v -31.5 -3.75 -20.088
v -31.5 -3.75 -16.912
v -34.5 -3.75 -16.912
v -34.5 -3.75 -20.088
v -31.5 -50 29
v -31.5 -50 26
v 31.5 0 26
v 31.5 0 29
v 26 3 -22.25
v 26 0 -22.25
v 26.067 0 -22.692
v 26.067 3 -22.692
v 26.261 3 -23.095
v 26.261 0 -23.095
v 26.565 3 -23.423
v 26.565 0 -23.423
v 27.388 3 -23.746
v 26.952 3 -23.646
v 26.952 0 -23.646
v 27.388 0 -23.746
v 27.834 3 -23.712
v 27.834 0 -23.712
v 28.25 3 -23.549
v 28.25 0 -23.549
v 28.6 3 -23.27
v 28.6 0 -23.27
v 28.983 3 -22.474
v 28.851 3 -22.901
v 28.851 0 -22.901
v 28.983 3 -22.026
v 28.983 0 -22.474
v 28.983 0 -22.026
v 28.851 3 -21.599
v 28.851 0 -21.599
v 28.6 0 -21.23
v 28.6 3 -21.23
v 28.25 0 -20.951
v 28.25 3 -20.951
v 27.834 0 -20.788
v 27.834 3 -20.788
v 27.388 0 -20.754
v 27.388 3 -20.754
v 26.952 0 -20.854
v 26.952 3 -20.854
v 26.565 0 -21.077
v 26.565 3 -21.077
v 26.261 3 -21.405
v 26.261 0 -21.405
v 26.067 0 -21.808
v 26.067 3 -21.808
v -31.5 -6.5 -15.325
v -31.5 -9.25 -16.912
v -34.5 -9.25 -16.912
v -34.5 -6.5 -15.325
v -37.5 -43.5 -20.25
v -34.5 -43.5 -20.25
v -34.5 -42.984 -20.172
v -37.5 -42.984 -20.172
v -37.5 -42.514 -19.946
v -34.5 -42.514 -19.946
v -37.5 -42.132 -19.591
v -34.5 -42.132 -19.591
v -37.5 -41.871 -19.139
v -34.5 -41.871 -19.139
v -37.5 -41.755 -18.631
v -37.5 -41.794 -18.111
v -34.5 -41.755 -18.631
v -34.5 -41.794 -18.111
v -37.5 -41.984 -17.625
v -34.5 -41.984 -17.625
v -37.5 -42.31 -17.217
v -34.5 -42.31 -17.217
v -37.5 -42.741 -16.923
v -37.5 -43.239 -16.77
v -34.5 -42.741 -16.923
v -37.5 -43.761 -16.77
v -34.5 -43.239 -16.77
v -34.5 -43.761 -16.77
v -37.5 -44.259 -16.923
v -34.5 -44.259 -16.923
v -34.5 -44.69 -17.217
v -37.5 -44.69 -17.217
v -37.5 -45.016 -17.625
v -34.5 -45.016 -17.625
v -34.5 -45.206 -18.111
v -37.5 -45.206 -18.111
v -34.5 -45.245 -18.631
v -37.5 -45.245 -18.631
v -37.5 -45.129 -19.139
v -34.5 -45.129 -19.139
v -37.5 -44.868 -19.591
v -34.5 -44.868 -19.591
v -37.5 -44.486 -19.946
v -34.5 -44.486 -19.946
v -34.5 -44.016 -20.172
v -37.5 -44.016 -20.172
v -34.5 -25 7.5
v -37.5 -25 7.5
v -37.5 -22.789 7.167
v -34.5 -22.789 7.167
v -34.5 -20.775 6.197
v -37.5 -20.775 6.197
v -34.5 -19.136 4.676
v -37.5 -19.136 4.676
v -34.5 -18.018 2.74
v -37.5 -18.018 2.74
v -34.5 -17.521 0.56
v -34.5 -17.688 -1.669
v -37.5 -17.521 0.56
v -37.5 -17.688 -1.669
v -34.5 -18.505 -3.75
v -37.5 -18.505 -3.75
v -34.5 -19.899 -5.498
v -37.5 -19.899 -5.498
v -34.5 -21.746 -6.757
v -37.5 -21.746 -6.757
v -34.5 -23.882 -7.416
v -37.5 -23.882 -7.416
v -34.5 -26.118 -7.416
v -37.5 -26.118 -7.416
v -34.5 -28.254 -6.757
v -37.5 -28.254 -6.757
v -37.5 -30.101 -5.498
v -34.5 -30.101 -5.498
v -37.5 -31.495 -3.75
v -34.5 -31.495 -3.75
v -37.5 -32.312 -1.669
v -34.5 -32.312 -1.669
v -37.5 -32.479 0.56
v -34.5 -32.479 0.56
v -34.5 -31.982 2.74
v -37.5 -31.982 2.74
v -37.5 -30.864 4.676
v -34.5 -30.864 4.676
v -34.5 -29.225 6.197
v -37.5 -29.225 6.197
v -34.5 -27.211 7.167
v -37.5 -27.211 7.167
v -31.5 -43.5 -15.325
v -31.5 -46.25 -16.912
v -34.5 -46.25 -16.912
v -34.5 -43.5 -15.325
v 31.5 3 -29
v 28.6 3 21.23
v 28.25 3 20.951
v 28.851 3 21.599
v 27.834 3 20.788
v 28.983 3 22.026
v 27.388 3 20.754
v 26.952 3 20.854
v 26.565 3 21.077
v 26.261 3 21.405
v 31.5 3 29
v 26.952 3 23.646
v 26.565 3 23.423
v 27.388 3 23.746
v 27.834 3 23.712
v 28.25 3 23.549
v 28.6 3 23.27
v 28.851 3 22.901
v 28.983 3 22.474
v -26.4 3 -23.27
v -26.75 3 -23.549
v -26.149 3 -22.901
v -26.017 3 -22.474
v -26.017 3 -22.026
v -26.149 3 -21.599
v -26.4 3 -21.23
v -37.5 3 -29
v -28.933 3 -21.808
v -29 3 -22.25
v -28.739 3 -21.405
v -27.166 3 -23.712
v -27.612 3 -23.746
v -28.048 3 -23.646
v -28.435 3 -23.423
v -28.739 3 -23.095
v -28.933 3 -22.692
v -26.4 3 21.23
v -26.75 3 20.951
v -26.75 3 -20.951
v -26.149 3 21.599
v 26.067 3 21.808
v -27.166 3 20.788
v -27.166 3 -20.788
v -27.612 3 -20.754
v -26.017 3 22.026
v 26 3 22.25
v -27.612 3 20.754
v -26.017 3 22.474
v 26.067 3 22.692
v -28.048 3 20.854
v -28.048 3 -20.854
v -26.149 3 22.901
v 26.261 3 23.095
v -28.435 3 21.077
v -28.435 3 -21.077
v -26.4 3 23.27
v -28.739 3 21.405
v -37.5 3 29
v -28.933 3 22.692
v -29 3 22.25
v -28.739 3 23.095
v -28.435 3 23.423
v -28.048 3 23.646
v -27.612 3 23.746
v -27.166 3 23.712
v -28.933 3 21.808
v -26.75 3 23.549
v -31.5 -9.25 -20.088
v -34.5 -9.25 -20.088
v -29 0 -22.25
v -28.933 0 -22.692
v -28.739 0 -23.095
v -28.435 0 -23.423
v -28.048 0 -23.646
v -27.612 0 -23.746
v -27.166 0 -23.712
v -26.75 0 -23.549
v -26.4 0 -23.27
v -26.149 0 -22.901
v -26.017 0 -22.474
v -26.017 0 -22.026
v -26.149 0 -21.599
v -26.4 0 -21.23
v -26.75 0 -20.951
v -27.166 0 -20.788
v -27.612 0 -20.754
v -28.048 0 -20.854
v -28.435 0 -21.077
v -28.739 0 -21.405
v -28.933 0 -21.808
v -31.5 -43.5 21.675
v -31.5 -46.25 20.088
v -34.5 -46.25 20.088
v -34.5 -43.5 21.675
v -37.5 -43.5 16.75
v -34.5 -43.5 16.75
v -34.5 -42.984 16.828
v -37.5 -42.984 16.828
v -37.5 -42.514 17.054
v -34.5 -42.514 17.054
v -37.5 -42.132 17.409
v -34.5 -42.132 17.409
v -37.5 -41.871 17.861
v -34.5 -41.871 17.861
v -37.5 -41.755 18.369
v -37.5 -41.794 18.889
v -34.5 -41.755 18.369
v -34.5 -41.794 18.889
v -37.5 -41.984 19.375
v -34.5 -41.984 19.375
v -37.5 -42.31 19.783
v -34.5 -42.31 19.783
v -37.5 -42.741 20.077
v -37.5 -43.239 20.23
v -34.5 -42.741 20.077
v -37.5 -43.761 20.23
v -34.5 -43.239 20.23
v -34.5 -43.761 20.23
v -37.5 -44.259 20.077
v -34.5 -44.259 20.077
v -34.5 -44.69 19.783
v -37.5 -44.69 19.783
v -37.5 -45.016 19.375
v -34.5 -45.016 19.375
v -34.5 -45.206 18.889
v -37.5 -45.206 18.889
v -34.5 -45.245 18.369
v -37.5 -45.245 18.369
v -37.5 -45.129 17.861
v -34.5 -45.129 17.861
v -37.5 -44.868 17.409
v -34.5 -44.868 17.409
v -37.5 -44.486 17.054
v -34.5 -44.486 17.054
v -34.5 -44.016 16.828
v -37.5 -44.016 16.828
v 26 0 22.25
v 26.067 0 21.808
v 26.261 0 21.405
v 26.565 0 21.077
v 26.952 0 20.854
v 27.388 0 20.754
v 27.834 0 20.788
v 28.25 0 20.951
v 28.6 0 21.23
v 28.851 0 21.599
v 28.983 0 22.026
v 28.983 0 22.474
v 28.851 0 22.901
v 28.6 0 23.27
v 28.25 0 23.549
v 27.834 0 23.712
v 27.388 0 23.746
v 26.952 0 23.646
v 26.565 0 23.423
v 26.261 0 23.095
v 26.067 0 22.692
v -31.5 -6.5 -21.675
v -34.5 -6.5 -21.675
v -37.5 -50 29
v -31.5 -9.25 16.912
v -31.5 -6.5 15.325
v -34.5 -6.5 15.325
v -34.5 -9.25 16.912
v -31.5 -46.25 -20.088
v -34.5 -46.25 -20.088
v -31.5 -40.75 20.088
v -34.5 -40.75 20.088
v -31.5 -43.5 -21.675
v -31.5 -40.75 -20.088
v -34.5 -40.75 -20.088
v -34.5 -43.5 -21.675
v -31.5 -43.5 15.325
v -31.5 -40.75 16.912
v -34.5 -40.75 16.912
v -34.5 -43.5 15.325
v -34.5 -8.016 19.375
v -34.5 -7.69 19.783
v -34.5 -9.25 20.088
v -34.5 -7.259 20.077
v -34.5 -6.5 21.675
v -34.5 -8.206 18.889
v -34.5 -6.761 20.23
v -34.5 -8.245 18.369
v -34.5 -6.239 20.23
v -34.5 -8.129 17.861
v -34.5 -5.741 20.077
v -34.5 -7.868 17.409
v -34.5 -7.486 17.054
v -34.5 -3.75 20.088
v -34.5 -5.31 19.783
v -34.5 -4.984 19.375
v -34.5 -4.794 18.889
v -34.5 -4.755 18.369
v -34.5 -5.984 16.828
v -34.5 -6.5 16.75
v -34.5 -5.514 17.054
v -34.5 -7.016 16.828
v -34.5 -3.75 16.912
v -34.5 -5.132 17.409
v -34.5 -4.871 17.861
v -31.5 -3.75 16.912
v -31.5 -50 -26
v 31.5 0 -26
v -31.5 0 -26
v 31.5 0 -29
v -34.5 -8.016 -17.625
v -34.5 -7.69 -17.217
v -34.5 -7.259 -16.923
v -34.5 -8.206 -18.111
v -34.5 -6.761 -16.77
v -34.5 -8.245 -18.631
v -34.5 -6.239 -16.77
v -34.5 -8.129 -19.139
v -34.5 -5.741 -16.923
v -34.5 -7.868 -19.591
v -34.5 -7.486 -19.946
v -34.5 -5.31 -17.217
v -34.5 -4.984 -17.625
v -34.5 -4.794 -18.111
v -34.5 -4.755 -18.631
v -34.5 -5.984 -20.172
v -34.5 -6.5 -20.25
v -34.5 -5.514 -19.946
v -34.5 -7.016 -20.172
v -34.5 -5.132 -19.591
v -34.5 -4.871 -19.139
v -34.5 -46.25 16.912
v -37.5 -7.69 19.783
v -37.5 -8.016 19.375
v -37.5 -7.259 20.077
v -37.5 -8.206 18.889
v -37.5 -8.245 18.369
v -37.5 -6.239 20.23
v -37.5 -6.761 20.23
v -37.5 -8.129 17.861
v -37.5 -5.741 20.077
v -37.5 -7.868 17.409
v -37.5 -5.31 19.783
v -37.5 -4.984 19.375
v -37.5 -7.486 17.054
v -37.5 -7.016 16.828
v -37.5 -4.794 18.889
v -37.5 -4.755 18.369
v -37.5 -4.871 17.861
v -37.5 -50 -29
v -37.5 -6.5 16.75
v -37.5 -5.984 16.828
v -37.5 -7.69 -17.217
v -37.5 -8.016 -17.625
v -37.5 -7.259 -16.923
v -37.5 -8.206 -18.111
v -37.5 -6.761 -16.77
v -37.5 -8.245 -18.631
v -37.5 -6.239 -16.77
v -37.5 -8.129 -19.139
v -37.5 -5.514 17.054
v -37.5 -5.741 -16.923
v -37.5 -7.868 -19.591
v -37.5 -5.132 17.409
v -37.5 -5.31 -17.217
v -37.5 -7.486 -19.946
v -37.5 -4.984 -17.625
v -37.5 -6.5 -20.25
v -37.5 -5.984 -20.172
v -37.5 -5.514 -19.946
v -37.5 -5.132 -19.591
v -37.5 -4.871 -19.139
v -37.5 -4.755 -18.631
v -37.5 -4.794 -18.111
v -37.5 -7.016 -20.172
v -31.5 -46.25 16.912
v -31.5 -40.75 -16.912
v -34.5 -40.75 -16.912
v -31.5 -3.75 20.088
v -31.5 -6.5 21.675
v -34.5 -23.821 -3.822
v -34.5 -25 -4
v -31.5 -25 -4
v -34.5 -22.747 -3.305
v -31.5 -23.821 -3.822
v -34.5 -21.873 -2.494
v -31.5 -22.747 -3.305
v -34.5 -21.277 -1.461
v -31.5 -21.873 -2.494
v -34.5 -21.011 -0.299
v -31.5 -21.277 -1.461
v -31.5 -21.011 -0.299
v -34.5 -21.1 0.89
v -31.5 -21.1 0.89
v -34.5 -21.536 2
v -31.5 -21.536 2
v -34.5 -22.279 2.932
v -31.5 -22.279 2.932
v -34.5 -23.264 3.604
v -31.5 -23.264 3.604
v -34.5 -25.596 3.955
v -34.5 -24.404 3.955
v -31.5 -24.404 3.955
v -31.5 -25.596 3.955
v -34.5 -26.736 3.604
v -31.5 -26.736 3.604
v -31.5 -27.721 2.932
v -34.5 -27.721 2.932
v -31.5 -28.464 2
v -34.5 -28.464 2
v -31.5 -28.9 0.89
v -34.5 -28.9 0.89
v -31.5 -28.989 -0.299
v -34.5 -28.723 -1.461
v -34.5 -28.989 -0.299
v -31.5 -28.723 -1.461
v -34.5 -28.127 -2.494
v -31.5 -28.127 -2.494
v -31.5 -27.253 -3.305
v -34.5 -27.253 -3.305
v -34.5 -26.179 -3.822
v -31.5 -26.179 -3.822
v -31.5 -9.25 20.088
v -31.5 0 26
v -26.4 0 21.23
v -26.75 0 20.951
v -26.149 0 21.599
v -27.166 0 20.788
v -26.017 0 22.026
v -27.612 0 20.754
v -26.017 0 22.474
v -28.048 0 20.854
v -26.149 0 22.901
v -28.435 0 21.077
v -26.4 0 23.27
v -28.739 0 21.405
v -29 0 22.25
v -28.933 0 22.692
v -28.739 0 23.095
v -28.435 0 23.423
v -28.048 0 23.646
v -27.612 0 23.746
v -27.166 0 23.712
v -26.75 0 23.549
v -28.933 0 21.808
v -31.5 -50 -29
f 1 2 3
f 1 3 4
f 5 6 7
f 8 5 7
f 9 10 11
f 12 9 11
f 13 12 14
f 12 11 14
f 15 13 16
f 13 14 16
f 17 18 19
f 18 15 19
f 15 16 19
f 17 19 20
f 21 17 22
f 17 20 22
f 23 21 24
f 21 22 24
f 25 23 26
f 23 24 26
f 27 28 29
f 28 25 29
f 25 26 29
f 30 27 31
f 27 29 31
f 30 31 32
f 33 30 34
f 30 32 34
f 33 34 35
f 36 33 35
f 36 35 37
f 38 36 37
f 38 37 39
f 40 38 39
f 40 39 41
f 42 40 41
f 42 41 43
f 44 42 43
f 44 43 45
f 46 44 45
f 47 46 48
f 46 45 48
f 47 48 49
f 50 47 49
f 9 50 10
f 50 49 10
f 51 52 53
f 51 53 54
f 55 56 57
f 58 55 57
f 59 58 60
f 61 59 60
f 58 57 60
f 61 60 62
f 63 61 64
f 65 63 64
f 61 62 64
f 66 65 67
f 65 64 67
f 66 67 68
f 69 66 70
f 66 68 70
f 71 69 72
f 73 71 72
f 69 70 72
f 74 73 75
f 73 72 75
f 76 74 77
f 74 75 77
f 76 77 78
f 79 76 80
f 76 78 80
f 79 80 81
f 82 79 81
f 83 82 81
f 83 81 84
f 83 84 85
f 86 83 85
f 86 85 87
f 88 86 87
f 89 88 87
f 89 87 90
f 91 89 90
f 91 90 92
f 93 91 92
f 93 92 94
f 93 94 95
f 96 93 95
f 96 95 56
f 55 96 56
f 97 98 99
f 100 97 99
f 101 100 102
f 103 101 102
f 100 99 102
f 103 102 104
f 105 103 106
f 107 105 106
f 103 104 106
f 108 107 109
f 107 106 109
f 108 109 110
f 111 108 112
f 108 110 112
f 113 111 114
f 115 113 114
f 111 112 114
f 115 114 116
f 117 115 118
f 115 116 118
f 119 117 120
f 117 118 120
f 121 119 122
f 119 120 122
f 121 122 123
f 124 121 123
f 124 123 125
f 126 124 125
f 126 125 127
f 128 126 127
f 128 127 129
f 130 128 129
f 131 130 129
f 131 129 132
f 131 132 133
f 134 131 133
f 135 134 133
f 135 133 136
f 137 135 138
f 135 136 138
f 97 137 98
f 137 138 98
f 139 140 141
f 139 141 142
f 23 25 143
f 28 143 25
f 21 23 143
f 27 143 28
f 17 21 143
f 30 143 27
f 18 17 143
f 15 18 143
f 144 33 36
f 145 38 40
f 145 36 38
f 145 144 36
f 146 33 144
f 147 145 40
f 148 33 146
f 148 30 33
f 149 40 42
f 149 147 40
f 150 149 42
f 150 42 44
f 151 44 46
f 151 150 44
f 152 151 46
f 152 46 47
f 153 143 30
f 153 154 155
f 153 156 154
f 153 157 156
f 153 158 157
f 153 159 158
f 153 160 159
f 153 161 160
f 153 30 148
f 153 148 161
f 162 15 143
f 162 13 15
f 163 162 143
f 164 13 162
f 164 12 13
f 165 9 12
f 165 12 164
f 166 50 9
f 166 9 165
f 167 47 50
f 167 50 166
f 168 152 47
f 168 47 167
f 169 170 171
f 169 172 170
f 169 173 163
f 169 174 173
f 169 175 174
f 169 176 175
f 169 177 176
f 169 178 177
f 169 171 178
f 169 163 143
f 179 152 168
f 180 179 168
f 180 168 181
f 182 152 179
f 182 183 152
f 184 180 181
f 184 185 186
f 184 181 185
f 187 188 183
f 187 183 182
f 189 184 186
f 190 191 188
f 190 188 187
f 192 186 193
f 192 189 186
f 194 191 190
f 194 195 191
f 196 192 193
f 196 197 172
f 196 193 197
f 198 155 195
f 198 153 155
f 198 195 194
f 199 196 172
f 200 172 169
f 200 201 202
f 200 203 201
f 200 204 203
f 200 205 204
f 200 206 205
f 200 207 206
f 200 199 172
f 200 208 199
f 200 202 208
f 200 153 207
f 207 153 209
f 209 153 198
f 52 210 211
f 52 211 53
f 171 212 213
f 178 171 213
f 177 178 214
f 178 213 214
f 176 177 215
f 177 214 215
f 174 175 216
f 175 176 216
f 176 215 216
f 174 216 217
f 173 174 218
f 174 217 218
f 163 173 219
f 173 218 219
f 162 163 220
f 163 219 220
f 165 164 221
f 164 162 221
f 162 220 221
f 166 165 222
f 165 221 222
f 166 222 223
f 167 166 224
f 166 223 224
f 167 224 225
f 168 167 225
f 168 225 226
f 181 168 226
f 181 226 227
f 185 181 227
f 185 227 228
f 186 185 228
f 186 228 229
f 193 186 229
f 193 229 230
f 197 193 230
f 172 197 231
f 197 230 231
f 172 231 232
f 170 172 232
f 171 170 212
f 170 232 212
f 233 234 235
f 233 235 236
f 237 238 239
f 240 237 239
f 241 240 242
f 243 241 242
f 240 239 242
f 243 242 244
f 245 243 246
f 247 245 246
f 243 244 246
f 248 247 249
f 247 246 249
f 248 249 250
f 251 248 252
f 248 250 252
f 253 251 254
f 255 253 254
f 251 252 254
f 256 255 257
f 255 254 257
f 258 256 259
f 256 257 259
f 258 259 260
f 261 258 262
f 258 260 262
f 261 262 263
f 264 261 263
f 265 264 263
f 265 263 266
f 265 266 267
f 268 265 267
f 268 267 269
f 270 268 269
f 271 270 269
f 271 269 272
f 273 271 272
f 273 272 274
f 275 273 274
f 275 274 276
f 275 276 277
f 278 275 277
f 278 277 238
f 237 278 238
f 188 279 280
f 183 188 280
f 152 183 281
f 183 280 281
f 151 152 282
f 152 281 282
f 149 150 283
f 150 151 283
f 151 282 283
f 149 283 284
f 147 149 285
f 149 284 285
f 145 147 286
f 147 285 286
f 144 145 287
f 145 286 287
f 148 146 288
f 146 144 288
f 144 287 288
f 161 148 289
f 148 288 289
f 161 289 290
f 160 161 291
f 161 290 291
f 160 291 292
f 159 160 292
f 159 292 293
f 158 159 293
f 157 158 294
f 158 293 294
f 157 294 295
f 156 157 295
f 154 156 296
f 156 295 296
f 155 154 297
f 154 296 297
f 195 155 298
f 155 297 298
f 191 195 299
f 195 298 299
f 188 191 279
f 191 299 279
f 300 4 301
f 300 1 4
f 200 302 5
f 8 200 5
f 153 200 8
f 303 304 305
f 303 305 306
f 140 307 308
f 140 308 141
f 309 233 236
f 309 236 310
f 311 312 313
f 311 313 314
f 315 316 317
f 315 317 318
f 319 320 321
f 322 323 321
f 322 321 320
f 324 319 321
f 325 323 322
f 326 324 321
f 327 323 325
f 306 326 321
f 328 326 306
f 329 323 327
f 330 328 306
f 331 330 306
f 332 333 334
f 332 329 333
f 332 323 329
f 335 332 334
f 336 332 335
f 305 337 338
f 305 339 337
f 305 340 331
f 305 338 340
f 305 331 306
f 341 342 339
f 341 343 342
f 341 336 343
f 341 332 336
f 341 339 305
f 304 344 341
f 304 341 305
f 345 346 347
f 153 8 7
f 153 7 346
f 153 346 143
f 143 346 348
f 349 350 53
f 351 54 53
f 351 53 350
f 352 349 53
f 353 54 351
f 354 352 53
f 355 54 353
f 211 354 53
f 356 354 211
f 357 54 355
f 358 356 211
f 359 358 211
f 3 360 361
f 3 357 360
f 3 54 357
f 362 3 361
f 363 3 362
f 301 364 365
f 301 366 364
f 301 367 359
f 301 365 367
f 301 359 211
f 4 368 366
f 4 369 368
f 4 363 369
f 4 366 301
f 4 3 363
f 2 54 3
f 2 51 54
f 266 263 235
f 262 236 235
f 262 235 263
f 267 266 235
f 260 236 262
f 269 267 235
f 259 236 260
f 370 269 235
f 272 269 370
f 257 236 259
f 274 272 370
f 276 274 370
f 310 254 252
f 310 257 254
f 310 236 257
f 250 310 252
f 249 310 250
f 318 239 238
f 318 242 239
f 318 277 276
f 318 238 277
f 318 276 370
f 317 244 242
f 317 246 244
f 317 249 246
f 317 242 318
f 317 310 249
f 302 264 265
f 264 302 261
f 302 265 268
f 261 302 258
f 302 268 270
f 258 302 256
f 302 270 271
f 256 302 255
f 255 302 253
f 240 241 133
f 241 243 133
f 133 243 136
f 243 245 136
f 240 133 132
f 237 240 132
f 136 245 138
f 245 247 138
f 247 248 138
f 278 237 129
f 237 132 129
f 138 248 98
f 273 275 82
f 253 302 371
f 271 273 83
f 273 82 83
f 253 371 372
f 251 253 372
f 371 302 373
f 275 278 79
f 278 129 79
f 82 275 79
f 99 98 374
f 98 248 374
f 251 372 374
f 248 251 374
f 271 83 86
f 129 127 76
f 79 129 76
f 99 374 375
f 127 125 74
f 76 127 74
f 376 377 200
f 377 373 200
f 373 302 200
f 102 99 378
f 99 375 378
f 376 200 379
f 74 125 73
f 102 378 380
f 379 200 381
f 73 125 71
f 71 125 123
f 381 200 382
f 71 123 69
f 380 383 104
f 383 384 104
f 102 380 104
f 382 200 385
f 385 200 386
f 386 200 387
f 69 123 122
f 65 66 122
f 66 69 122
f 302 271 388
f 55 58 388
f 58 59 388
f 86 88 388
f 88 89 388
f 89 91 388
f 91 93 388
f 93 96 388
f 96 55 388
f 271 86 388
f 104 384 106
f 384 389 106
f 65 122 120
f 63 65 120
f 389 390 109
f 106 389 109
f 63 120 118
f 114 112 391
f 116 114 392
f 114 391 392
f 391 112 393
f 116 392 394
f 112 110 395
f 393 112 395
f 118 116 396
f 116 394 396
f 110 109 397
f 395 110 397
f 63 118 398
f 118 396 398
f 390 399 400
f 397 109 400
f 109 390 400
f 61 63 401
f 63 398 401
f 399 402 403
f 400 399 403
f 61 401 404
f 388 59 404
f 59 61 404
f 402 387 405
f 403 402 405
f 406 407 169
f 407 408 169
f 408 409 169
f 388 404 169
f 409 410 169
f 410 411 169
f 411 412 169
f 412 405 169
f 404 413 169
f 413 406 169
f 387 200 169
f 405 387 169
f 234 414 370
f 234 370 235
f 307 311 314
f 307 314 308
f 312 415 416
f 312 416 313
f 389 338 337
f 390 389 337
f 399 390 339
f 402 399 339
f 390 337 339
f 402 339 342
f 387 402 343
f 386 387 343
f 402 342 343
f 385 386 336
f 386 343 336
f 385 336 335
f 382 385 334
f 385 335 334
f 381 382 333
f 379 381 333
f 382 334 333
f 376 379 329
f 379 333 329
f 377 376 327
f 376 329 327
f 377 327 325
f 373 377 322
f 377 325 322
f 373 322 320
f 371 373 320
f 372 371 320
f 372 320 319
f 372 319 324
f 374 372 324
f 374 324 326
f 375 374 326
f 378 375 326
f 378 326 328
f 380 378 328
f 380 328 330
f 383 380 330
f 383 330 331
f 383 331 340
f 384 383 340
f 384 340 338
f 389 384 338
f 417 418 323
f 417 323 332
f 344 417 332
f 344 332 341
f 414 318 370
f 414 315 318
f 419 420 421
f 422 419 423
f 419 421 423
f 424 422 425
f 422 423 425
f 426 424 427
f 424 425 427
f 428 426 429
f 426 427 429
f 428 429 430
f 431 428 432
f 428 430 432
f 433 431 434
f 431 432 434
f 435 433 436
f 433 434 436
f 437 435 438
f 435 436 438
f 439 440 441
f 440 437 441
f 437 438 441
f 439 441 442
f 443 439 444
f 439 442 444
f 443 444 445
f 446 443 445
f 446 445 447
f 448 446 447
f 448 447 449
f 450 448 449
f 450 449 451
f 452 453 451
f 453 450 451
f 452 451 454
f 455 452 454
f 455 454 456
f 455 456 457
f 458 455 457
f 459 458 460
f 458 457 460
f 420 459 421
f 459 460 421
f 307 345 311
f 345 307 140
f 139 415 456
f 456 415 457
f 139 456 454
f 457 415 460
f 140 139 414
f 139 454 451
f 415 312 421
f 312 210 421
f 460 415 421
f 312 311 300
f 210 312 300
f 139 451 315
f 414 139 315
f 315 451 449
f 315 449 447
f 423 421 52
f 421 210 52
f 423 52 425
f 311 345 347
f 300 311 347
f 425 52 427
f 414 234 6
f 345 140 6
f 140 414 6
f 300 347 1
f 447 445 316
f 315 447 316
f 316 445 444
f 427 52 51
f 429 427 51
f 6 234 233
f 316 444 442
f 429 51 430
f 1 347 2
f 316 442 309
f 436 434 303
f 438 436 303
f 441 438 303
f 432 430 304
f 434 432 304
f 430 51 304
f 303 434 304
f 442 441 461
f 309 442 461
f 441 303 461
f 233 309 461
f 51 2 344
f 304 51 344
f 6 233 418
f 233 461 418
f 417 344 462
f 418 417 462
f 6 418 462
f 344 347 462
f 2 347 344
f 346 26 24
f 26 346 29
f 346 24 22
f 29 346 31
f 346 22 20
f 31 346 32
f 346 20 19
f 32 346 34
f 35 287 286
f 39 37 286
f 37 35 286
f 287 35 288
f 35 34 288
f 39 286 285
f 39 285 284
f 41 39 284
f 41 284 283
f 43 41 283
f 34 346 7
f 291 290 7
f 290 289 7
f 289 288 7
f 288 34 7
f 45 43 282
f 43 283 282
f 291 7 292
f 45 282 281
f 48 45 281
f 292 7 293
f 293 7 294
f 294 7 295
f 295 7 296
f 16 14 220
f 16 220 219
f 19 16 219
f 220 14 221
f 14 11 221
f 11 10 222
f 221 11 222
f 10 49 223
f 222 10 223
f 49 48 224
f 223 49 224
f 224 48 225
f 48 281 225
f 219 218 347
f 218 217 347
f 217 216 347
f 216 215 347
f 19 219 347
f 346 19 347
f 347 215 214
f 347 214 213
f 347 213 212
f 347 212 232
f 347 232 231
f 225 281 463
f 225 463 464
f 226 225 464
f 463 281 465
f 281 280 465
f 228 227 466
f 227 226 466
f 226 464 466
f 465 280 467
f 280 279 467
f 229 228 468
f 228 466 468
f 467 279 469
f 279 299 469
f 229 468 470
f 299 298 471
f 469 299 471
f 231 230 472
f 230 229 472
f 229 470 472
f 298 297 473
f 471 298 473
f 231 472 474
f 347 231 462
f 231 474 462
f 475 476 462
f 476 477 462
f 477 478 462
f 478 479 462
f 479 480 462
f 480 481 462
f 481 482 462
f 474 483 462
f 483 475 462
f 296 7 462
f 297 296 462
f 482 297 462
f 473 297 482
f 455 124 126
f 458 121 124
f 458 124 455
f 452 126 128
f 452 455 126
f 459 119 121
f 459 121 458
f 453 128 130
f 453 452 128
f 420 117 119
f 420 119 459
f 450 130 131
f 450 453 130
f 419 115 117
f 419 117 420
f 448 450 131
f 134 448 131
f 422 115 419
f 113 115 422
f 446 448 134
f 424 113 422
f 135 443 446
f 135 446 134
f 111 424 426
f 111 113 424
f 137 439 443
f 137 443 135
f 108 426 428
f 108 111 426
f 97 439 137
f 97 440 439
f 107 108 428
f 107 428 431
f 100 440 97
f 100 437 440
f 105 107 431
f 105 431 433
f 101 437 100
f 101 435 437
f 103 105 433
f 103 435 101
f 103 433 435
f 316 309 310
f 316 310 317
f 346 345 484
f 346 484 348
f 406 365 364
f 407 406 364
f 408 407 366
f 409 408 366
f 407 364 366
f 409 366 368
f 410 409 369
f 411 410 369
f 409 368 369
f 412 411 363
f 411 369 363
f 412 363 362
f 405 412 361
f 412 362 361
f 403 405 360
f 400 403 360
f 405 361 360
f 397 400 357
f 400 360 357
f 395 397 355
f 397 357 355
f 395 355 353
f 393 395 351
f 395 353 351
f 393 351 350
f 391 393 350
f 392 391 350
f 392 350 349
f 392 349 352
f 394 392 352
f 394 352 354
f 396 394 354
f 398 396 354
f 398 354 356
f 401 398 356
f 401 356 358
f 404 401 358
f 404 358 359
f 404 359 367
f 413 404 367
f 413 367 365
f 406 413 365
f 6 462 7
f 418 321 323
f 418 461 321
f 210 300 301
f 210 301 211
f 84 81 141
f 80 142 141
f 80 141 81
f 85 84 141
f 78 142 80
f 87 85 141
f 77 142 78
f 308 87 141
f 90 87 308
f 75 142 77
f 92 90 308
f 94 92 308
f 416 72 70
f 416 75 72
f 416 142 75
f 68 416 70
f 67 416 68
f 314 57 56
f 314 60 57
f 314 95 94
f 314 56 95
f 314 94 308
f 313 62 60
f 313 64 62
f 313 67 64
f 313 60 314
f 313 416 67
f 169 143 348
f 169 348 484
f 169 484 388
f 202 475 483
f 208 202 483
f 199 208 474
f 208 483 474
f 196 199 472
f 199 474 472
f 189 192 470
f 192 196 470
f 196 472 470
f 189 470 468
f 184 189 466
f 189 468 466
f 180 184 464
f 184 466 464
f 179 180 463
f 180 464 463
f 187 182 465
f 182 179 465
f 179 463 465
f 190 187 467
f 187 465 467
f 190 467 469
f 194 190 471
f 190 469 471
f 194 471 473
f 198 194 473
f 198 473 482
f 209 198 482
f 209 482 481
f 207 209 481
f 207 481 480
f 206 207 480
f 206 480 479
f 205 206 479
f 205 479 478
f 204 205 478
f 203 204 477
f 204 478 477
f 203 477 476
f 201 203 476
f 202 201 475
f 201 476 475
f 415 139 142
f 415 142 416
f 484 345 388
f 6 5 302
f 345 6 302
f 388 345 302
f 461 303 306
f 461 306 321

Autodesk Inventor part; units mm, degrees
ref_plane "YZ Plane" through (0, 0, 0) normal (1, 0, 0) x (0, 1, 0)
ref_plane "XZ Plane" through (0, 0, 0) normal (0, 1, 0) x (-1, 0, 0)
ref_plane "XY Plane" through (0, 0, 0) normal (0, 0, 1) x (1, 0, 0)
sketch "Skizze1" plane through (0, 0, 0) normal (0, 1, 0) x (-1, 0, 0)
  line L0 (-31.5, -26) -> (31.5, -26)
  line L1 (31.5, -26) -> (31.5, 26)
  line L2 (31.5, 26) -> (-31.5, 26)
  line L3 (-31.5, 26) -> (-31.5, -26)
  line L4 (-31.5, -26) -> (31.5, 26) construction
  line L5 (31.5, -26) -> (-31.5, 26) construction
  circle A0 centre (27.5, 22.25) radius 1.5
  circle A1 centre (-27.5, 22.25) radius 1.5
  circle A2 centre (-27.5, -22.25) radius 1.5
  circle A3 centre (27.5, -22.25) radius 1.5
  line L6 (31.5, 0) -> (-31.5, 0) construction
  line L7 (0, 26) -> (0, -26) construction
  line L8 (31.5, -26) -> (31.5, 26)
  line L9 (31.5, 26) -> (37.5, 26)
  line L10 (37.5, 26) -> (37.5, -26)
  line L11 (37.5, -26) -> (31.5, -26)
  point P0 (0, 0)
  dimension "d0" = 63
  dimension "d1" = 52
  dimension "d4" = 3
  dimension "d9" = 44.5
  dimension "d10" = 55
  dimension "d11" = 6
extrude "Extrusion1" add sketch "Skizze1" along normal blind 3
extrude "Extrusion2" add sketch "Skizze1" against normal blind 50 contours L1 L9 L10 L11
sketch "Skizze2" plane through (-31.5, -50, 26) normal (1, 0, 0) x (0, 0, -1)
  line L0 (52, 0) -> (0, 0) projected
  line L1 (26, 50) -> (26, 0) construction
  line L2 (7.5, 6.5) -> (44.5, 6.5)
  line L3 (44.5, 6.5) -> (44.5, 43.5)
  line L4 (44.5, 43.5) -> (7.5, 43.5)
  line L5 (7.5, 43.5) -> (7.5, 6.5)
  line L6 (7.5, 6.5) -> (44.5, 43.5) construction
  line L7 (44.5, 6.5) -> (7.5, 43.5) construction
  line L8 (42.9123, 3.75) -> (41.3246, 6.5)
  line L9 (41.3246, 6.5) -> (42.9123, 9.25)
  line L10 (42.9123, 9.25) -> (46.0877, 9.25)
  line L11 (46.0877, 9.25) -> (47.6754, 6.5)
  line L12 (47.6754, 6.5) -> (46.0877, 3.75)
  line L13 (46.0877, 3.75) -> (42.9123, 3.75)
  line L14 (5.9123, 3.75) -> (4.3246, 6.5)
  line L15 (4.3246, 6.5) -> (5.9123, 9.25)
  line L16 (5.9123, 9.25) -> (9.0877, 9.25)
  line L17 (9.0877, 9.25) -> (10.6754, 6.5)
  line L18 (10.6754, 6.5) -> (9.0877, 3.75)
  line L19 (9.0877, 3.75) -> (5.9123, 3.75)
  line L20 (41.3246, 43.5) -> (42.9123, 46.25)
  line L21 (42.9123, 46.25) -> (46.0877, 46.25)
  line L22 (46.0877, 46.25) -> (47.6754, 43.5)
  line L23 (47.6754, 43.5) -> (46.0877, 40.75)
  line L24 (46.0877, 40.75) -> (42.9123, 40.75)
  line L25 (42.9123, 40.75) -> (41.3246, 43.5)
  line L26 (4.3246, 43.5) -> (5.9123, 46.25)
  line L27 (5.9123, 46.25) -> (9.0877, 46.25)
  line L28 (9.0877, 46.25) -> (10.6754, 43.5)
  line L29 (10.6754, 43.5) -> (9.0877, 40.75)
  line L30 (9.0877, 40.75) -> (5.9123, 40.75)
  line L31 (5.9123, 40.75) -> (4.3246, 43.5)
  circle A0 centre (44.5, 6.5) radius 1.75
  circle A1 centre (7.5, 6.5) radius 1.75
  circle A2 centre (44.5, 43.5) radius 1.75
  circle A3 centre (7.5, 43.5) radius 1.75
  circle A4 centre (26, 25) radius 4
  point P0 (26, 25)
  dimension "d30" = 37
  dimension "d31" = 37
  dimension "d39" = 5.5
  dimension "d42" = 3.5
  dimension "d45" = 8
extrude "Extrusion4" cut sketch "Skizze2" against normal through all contours L5 A1 L2 | L2 A1 L5 | A0 L3 L2 | L2 L3 A0 | A3 L4 L5 | L5 L4 A3 | A2 L4 L3 | L3 L4 A2 | A4
extrude "Extrusion3" cut sketch "Skizze2" against normal blind 3 contours L5 A1 L2 | L2 A1 L5 | A1 L5 L16 L17 L2 | L2 L18 L19 L14 L15 L16 L5 A1 | L9 L10 L3 A0 L2 | L2 A0 L3 L10 L11 L12 L13 L8 | L30 L31 L26 L27 L28 L4 A3 L5 | L5 A3 L4 L29 L30 | A0 L3 L2 | L2 L3 A0 | A3 L4 L5 | L5 L4 A3 | L24 L25 L4 A2 L3 | L3 A2 L4 L20 L21 L22 L23 L24 | A2 L4 L3 | L3 L4 A2
sketch "Skizze3" plane through (31.5, 3, -26) normal (0, 0, -1) x (-1, 0, 0)
  line L0 (0, -3) -> (63, -3) projected
  line L1 (63, -3) -> (63, -53) projected
  line L2 (69, -53) -> (63, -53) projected
  line L3 (69, -53) -> (69, 0) projected
  line L4 (0, 0) -> (69, 0) projected
  line L5 (0, -3) -> (0, 0) projected
  line L6 (63, -53) -> (0, -3)
  point P0 (31.5, -3)
extrude "Extrusion5" add sketch "Skizze3" along normal blind 3
sketch "Skizze4" plane through (-37.5, 3, 26) normal (0, 0, 1) x (1, 0, 0)
  line L0 (6, -3) -> (69, -3) projected
  line L1 (69, -3) -> (69, 0) projected
  line L2 (0, 0) -> (69, 0) projected
  line L3 (0, -53) -> (0, 0) projected
  line L4 (6, -53) -> (0, -53) projected
  line L5 (6, -3) -> (6, -53) projected
  line L6 (6, -53) -> (69, -3)
  point P0 (37.5, -3)
extrude "Extrusion6" add sketch "Skizze4" along normal blind 3
sketch "Skizze5" plane through (-37.5, -50, -29) normal (-1, 0, 0) x (0, 0, 1)
  circle A0 centre (29, 25) radius 4 projected
  circle A1 centre (29, 25) radius 7.5
  point P0 (29, 50)
  dimension "d51" = 15
extrude "Extrusion7" cut sketch "Skizze5" against normal blind 3
equation "\"d31\" = d30"
properties part number "Sanftanlauf_Halter"
